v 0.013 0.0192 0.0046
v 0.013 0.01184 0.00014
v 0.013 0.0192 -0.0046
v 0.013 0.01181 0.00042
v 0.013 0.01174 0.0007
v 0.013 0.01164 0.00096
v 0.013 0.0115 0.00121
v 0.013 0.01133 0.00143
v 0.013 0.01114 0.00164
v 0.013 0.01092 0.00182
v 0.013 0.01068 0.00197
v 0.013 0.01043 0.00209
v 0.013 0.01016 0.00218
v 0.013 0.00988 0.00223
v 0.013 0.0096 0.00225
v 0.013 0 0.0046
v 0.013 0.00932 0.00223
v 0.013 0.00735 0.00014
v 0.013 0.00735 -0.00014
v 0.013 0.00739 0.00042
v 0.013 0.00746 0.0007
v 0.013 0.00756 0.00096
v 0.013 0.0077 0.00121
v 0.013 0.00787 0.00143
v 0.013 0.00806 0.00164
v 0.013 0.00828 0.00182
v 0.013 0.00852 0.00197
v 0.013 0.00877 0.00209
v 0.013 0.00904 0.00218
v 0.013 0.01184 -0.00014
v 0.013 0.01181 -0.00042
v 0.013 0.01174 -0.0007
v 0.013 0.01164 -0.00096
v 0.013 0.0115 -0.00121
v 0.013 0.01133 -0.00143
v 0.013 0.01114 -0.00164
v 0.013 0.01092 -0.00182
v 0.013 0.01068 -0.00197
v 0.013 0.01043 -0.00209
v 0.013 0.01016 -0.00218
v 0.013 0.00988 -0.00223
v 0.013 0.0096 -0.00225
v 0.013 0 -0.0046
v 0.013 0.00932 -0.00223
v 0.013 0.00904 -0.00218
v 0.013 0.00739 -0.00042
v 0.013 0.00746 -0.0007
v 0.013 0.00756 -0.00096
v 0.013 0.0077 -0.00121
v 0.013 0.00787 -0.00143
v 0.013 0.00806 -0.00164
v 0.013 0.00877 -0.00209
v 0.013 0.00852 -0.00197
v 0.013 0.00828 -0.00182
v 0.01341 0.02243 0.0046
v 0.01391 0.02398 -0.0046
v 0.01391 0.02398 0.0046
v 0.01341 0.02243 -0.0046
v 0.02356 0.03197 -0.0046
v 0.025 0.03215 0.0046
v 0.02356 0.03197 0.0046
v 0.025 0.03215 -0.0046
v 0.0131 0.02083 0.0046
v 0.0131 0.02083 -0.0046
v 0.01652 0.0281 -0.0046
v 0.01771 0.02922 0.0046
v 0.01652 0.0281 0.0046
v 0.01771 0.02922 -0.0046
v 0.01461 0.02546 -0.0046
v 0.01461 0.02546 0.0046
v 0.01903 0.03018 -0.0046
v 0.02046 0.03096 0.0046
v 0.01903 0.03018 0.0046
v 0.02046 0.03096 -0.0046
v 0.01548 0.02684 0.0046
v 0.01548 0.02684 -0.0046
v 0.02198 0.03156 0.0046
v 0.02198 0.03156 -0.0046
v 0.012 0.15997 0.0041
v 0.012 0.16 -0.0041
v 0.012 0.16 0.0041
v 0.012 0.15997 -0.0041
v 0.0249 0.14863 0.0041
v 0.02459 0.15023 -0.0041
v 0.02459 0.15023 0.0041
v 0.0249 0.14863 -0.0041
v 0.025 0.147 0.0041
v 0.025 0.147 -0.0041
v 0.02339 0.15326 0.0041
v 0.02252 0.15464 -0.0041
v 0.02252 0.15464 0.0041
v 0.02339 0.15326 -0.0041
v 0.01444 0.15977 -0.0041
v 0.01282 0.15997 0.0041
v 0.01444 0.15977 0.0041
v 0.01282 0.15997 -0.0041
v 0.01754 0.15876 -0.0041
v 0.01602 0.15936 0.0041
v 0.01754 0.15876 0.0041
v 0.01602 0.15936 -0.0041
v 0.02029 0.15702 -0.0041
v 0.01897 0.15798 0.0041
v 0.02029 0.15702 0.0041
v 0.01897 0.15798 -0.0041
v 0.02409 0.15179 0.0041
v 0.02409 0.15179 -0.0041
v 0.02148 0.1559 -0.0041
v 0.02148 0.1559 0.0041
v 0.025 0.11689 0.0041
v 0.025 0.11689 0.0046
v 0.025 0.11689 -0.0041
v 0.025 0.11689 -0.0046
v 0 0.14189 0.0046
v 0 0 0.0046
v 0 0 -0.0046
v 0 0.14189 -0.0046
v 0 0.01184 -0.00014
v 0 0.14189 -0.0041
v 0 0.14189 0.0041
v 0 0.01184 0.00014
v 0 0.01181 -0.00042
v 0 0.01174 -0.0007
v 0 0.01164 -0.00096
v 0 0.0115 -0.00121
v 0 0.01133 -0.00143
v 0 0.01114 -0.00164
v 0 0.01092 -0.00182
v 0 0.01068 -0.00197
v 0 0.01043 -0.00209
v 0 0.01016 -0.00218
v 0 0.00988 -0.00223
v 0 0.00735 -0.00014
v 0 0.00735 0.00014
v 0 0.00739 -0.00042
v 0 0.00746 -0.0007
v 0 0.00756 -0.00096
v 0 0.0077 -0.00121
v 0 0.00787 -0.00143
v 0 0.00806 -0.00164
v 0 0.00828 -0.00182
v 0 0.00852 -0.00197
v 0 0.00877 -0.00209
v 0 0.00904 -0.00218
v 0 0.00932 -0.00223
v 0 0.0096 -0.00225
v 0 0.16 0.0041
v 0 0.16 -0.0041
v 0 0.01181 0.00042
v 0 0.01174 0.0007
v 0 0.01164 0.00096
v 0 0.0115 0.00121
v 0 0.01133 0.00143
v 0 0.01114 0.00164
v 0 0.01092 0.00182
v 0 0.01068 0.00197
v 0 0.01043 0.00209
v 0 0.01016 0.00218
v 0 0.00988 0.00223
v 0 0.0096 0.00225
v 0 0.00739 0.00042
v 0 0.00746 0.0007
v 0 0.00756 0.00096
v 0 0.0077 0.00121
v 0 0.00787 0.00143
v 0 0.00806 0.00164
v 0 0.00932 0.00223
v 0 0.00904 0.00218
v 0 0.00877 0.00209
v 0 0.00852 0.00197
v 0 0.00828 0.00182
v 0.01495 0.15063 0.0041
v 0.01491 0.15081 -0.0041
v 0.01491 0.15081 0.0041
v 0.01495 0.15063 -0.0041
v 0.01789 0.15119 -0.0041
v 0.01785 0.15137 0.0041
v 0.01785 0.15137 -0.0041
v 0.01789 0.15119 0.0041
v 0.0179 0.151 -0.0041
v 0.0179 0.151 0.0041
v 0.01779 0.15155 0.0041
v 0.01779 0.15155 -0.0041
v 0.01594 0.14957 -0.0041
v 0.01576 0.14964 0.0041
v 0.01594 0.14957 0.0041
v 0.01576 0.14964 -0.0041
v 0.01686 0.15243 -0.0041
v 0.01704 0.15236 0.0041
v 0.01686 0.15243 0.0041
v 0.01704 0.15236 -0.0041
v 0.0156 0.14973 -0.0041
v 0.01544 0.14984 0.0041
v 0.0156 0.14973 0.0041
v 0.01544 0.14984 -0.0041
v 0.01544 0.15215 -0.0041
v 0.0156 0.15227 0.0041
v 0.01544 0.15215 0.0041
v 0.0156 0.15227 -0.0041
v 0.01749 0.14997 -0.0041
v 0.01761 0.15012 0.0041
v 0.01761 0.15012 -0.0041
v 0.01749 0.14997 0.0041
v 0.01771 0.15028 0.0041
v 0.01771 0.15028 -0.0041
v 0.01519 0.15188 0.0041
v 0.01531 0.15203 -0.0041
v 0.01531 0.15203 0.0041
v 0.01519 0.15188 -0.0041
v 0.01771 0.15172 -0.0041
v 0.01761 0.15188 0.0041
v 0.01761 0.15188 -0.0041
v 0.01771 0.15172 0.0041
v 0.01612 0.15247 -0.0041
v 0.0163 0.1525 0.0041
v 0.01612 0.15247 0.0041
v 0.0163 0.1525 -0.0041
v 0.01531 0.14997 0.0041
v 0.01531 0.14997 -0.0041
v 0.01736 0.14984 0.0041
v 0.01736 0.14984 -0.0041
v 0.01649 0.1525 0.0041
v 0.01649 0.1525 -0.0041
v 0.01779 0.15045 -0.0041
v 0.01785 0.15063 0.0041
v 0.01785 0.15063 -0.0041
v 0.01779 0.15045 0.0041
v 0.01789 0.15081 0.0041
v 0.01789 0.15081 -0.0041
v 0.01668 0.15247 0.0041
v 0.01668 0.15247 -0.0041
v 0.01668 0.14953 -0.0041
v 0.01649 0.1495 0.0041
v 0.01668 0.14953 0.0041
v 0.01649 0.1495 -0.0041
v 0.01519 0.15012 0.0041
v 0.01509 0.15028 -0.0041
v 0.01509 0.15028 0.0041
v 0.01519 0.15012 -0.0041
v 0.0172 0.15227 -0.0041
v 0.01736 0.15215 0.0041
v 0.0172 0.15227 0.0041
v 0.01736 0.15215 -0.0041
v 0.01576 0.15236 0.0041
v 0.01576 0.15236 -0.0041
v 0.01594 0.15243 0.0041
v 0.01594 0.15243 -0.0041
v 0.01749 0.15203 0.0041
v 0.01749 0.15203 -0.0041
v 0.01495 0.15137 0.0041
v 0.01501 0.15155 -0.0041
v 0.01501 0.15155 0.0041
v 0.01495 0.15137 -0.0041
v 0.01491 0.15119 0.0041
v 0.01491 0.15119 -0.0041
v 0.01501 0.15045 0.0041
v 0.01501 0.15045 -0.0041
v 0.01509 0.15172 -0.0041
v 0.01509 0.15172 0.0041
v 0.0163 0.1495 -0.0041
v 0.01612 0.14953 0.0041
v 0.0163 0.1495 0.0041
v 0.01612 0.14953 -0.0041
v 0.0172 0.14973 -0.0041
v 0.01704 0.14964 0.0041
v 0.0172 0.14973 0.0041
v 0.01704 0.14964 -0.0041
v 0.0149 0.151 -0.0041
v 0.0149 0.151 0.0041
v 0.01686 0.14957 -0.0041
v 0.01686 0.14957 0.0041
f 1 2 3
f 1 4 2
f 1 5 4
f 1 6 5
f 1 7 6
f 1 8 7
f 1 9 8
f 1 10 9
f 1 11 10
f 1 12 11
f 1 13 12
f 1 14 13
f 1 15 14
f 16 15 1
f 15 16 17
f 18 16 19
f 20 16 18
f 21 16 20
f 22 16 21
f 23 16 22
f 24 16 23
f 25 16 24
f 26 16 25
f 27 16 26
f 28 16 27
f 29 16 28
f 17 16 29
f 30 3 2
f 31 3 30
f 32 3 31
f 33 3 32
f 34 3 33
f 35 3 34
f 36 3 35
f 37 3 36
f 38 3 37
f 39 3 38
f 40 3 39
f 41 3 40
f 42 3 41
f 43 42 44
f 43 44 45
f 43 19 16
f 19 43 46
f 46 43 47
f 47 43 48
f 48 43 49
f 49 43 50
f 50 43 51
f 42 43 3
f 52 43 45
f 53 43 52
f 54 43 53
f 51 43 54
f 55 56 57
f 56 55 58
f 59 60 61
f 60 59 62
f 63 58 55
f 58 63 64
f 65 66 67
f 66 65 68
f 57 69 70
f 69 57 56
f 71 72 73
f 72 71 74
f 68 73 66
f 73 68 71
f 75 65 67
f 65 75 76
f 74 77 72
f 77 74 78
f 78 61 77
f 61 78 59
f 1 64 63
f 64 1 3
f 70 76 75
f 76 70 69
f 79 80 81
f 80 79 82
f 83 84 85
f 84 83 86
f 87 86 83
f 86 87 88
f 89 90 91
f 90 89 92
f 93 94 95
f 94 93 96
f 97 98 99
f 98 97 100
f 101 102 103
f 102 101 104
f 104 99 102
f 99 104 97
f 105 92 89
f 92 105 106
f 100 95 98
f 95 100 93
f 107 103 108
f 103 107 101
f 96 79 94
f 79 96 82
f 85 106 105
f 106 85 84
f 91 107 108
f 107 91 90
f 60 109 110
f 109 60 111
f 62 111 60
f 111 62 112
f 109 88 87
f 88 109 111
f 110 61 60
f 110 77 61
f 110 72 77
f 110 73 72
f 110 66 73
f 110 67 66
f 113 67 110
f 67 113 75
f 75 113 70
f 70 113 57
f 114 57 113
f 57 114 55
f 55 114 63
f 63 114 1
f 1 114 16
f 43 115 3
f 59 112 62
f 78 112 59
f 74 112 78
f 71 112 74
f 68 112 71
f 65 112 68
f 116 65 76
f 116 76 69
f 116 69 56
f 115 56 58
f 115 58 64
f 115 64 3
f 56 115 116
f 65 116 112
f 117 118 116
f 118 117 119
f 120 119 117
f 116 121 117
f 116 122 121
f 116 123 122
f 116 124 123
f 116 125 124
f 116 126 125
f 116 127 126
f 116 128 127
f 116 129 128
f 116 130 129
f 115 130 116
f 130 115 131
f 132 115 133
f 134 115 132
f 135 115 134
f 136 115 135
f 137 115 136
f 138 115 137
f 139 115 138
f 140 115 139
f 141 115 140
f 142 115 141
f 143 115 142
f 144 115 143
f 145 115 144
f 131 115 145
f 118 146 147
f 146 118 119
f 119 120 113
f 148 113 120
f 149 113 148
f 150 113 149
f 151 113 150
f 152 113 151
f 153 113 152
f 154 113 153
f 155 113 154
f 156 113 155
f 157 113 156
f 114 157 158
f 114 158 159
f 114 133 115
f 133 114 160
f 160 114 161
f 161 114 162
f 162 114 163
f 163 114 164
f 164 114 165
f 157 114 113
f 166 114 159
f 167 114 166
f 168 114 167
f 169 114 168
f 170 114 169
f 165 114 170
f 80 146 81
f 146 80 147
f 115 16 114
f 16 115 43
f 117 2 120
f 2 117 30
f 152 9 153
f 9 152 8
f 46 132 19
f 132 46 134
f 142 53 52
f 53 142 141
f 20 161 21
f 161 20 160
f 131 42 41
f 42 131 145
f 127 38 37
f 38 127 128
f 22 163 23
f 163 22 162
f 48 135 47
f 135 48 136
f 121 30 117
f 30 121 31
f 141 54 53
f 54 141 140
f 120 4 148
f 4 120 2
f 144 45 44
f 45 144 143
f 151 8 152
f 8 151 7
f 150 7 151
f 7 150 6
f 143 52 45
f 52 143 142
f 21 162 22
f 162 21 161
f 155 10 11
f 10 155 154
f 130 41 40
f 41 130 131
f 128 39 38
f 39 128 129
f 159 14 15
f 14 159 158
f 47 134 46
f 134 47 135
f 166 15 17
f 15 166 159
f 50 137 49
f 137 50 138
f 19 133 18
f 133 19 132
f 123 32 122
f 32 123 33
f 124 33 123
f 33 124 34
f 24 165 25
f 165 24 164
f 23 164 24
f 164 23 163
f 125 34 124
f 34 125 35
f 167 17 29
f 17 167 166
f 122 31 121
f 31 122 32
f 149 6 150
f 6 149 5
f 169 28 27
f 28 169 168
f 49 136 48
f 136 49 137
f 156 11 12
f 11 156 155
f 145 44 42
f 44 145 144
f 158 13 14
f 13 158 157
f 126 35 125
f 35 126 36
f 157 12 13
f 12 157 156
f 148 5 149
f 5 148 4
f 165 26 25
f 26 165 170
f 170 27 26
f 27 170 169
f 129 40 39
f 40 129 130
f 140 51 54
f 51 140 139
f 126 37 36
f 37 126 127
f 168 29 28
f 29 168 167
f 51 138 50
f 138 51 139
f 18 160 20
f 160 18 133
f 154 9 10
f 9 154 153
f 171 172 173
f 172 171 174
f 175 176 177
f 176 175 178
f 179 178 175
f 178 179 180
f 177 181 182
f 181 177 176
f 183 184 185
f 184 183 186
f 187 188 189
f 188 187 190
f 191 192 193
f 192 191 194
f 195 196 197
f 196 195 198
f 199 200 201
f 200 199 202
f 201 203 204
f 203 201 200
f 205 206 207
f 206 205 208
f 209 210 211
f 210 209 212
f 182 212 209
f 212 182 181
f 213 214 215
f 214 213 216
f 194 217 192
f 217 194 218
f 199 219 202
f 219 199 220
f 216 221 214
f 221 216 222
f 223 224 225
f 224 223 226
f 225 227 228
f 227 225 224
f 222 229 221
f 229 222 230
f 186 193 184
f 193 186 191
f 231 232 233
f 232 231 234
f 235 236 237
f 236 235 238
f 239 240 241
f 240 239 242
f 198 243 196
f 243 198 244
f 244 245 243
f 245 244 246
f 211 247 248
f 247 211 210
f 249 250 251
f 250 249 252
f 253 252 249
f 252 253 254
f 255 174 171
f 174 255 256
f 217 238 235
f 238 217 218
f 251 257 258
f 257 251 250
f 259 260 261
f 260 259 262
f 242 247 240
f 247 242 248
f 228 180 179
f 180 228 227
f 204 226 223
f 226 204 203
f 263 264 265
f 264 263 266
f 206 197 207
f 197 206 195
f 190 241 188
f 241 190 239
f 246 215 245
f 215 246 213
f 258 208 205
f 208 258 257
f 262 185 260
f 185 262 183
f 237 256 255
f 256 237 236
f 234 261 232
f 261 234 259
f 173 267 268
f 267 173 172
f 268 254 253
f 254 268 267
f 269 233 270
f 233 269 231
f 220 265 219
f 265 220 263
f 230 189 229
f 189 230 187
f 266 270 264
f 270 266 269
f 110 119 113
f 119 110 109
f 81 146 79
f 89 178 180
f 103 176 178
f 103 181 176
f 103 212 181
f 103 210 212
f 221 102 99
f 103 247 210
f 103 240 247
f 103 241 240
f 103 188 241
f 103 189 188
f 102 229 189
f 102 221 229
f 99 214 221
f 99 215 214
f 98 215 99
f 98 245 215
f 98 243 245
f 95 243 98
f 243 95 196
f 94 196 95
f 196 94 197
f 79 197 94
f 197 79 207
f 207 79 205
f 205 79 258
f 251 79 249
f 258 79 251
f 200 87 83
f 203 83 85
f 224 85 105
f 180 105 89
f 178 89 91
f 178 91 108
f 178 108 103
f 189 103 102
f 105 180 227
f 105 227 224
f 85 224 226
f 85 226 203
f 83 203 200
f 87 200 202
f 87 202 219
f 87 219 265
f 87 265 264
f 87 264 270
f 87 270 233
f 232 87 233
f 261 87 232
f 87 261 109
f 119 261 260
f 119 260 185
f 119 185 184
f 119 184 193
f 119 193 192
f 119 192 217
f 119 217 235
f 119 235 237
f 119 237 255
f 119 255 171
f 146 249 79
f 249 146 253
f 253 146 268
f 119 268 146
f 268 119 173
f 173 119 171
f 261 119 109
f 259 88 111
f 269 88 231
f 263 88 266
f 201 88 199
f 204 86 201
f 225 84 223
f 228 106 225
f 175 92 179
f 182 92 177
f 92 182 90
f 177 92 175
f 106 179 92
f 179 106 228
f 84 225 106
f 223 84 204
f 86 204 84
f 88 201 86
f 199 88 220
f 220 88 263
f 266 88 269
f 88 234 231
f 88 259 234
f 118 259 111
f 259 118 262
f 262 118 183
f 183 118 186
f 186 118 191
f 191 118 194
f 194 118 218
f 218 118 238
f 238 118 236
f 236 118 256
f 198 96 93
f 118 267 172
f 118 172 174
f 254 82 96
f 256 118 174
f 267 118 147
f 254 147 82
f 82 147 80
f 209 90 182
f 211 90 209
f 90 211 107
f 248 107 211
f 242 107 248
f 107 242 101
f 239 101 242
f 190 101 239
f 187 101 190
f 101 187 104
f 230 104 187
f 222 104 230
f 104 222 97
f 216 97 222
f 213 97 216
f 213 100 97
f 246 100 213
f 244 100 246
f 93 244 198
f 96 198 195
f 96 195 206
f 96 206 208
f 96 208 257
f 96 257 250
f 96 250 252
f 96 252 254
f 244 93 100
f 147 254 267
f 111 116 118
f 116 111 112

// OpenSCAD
// Dimensions in m (SI)
length = 0.16;
height = 0.025;
thick  = 0.0092;

screw_pos = 0.0096;
screw_dia = 0.0045;

tab_height = 0.013;
tab_length = screw_pos * 2;
tab_round  = tab_height;

// real pin: d=0.0048 -> drill to fit
pin_dia   = 0.003;
pin_depth = 0.0164;
pin_back  = 0.009;

// Thickness to cut for easier sliding (0 for no cut)
thick_cut = 0.001;

// instantiate
chinook();

module chinook()
{
    difference()
    {
        base_cube(length);
        tab_cut();
        screw_cut();
        back_round_cut(length);
        pin_cut(length);
        thickness_cut(length, thick/2);
        thickness_cut(length, -thick/2);
    }
}

module base_cube(BaseLength)
{
    translate([0,0,-thick/2])
    cube(size=[height,
               BaseLength,
               thick],
         center=false);
}

module tab_cut()
{
    translate([tab_height,0,-thick/2*1.1])
    union()
    {
        translate([0,-thick,0])
        cube(size=[height,
                   tab_length+thick,
                   thick*1.1],
             center=false);
        translate([tab_round,tab_length,0])
        cylinder(h=thick*1.1,
                 r=tab_round,
                 center=false,
                 $fn=50);
    }
}

module screw_cut()
{
    translate([tab_height/2,screw_pos,0])
    rotate([0,90,0])
    cylinder(h=tab_height*1.1,
             d=screw_dia,
             center=true,
             $fn=50);
}

module back_round_cut(BaseLength)
{
    translate([height-tab_round,
               BaseLength-tab_round,
               -thick/2*1.1])
    difference()
    {
        cube(size=[tab_round*1.1,
                   tab_round*1.1,
                   thick*1.1],
             center=false);
        cylinder(h=thick*1.2,
                 r=tab_round,
                 center=false,
                 $fn=50);
    }
}

module pin_cut(BaseLength)
{
    translate([pin_depth,
               BaseLength-pin_back,
               0])
    rotate([0,0,0])
    cylinder(h=tab_height*1.1,
             d=pin_dia,
             center=true,
             $fn=50);
}

module thickness_cut(BaseLength, zOffset)
{
    translate([pin_depth,
               BaseLength-pin_back,
               zOffset])
    rotate([0,0,45])
    cube(size=[pin_depth*2.2,
               height*3,
               thick_cut],
         center=true);
}
